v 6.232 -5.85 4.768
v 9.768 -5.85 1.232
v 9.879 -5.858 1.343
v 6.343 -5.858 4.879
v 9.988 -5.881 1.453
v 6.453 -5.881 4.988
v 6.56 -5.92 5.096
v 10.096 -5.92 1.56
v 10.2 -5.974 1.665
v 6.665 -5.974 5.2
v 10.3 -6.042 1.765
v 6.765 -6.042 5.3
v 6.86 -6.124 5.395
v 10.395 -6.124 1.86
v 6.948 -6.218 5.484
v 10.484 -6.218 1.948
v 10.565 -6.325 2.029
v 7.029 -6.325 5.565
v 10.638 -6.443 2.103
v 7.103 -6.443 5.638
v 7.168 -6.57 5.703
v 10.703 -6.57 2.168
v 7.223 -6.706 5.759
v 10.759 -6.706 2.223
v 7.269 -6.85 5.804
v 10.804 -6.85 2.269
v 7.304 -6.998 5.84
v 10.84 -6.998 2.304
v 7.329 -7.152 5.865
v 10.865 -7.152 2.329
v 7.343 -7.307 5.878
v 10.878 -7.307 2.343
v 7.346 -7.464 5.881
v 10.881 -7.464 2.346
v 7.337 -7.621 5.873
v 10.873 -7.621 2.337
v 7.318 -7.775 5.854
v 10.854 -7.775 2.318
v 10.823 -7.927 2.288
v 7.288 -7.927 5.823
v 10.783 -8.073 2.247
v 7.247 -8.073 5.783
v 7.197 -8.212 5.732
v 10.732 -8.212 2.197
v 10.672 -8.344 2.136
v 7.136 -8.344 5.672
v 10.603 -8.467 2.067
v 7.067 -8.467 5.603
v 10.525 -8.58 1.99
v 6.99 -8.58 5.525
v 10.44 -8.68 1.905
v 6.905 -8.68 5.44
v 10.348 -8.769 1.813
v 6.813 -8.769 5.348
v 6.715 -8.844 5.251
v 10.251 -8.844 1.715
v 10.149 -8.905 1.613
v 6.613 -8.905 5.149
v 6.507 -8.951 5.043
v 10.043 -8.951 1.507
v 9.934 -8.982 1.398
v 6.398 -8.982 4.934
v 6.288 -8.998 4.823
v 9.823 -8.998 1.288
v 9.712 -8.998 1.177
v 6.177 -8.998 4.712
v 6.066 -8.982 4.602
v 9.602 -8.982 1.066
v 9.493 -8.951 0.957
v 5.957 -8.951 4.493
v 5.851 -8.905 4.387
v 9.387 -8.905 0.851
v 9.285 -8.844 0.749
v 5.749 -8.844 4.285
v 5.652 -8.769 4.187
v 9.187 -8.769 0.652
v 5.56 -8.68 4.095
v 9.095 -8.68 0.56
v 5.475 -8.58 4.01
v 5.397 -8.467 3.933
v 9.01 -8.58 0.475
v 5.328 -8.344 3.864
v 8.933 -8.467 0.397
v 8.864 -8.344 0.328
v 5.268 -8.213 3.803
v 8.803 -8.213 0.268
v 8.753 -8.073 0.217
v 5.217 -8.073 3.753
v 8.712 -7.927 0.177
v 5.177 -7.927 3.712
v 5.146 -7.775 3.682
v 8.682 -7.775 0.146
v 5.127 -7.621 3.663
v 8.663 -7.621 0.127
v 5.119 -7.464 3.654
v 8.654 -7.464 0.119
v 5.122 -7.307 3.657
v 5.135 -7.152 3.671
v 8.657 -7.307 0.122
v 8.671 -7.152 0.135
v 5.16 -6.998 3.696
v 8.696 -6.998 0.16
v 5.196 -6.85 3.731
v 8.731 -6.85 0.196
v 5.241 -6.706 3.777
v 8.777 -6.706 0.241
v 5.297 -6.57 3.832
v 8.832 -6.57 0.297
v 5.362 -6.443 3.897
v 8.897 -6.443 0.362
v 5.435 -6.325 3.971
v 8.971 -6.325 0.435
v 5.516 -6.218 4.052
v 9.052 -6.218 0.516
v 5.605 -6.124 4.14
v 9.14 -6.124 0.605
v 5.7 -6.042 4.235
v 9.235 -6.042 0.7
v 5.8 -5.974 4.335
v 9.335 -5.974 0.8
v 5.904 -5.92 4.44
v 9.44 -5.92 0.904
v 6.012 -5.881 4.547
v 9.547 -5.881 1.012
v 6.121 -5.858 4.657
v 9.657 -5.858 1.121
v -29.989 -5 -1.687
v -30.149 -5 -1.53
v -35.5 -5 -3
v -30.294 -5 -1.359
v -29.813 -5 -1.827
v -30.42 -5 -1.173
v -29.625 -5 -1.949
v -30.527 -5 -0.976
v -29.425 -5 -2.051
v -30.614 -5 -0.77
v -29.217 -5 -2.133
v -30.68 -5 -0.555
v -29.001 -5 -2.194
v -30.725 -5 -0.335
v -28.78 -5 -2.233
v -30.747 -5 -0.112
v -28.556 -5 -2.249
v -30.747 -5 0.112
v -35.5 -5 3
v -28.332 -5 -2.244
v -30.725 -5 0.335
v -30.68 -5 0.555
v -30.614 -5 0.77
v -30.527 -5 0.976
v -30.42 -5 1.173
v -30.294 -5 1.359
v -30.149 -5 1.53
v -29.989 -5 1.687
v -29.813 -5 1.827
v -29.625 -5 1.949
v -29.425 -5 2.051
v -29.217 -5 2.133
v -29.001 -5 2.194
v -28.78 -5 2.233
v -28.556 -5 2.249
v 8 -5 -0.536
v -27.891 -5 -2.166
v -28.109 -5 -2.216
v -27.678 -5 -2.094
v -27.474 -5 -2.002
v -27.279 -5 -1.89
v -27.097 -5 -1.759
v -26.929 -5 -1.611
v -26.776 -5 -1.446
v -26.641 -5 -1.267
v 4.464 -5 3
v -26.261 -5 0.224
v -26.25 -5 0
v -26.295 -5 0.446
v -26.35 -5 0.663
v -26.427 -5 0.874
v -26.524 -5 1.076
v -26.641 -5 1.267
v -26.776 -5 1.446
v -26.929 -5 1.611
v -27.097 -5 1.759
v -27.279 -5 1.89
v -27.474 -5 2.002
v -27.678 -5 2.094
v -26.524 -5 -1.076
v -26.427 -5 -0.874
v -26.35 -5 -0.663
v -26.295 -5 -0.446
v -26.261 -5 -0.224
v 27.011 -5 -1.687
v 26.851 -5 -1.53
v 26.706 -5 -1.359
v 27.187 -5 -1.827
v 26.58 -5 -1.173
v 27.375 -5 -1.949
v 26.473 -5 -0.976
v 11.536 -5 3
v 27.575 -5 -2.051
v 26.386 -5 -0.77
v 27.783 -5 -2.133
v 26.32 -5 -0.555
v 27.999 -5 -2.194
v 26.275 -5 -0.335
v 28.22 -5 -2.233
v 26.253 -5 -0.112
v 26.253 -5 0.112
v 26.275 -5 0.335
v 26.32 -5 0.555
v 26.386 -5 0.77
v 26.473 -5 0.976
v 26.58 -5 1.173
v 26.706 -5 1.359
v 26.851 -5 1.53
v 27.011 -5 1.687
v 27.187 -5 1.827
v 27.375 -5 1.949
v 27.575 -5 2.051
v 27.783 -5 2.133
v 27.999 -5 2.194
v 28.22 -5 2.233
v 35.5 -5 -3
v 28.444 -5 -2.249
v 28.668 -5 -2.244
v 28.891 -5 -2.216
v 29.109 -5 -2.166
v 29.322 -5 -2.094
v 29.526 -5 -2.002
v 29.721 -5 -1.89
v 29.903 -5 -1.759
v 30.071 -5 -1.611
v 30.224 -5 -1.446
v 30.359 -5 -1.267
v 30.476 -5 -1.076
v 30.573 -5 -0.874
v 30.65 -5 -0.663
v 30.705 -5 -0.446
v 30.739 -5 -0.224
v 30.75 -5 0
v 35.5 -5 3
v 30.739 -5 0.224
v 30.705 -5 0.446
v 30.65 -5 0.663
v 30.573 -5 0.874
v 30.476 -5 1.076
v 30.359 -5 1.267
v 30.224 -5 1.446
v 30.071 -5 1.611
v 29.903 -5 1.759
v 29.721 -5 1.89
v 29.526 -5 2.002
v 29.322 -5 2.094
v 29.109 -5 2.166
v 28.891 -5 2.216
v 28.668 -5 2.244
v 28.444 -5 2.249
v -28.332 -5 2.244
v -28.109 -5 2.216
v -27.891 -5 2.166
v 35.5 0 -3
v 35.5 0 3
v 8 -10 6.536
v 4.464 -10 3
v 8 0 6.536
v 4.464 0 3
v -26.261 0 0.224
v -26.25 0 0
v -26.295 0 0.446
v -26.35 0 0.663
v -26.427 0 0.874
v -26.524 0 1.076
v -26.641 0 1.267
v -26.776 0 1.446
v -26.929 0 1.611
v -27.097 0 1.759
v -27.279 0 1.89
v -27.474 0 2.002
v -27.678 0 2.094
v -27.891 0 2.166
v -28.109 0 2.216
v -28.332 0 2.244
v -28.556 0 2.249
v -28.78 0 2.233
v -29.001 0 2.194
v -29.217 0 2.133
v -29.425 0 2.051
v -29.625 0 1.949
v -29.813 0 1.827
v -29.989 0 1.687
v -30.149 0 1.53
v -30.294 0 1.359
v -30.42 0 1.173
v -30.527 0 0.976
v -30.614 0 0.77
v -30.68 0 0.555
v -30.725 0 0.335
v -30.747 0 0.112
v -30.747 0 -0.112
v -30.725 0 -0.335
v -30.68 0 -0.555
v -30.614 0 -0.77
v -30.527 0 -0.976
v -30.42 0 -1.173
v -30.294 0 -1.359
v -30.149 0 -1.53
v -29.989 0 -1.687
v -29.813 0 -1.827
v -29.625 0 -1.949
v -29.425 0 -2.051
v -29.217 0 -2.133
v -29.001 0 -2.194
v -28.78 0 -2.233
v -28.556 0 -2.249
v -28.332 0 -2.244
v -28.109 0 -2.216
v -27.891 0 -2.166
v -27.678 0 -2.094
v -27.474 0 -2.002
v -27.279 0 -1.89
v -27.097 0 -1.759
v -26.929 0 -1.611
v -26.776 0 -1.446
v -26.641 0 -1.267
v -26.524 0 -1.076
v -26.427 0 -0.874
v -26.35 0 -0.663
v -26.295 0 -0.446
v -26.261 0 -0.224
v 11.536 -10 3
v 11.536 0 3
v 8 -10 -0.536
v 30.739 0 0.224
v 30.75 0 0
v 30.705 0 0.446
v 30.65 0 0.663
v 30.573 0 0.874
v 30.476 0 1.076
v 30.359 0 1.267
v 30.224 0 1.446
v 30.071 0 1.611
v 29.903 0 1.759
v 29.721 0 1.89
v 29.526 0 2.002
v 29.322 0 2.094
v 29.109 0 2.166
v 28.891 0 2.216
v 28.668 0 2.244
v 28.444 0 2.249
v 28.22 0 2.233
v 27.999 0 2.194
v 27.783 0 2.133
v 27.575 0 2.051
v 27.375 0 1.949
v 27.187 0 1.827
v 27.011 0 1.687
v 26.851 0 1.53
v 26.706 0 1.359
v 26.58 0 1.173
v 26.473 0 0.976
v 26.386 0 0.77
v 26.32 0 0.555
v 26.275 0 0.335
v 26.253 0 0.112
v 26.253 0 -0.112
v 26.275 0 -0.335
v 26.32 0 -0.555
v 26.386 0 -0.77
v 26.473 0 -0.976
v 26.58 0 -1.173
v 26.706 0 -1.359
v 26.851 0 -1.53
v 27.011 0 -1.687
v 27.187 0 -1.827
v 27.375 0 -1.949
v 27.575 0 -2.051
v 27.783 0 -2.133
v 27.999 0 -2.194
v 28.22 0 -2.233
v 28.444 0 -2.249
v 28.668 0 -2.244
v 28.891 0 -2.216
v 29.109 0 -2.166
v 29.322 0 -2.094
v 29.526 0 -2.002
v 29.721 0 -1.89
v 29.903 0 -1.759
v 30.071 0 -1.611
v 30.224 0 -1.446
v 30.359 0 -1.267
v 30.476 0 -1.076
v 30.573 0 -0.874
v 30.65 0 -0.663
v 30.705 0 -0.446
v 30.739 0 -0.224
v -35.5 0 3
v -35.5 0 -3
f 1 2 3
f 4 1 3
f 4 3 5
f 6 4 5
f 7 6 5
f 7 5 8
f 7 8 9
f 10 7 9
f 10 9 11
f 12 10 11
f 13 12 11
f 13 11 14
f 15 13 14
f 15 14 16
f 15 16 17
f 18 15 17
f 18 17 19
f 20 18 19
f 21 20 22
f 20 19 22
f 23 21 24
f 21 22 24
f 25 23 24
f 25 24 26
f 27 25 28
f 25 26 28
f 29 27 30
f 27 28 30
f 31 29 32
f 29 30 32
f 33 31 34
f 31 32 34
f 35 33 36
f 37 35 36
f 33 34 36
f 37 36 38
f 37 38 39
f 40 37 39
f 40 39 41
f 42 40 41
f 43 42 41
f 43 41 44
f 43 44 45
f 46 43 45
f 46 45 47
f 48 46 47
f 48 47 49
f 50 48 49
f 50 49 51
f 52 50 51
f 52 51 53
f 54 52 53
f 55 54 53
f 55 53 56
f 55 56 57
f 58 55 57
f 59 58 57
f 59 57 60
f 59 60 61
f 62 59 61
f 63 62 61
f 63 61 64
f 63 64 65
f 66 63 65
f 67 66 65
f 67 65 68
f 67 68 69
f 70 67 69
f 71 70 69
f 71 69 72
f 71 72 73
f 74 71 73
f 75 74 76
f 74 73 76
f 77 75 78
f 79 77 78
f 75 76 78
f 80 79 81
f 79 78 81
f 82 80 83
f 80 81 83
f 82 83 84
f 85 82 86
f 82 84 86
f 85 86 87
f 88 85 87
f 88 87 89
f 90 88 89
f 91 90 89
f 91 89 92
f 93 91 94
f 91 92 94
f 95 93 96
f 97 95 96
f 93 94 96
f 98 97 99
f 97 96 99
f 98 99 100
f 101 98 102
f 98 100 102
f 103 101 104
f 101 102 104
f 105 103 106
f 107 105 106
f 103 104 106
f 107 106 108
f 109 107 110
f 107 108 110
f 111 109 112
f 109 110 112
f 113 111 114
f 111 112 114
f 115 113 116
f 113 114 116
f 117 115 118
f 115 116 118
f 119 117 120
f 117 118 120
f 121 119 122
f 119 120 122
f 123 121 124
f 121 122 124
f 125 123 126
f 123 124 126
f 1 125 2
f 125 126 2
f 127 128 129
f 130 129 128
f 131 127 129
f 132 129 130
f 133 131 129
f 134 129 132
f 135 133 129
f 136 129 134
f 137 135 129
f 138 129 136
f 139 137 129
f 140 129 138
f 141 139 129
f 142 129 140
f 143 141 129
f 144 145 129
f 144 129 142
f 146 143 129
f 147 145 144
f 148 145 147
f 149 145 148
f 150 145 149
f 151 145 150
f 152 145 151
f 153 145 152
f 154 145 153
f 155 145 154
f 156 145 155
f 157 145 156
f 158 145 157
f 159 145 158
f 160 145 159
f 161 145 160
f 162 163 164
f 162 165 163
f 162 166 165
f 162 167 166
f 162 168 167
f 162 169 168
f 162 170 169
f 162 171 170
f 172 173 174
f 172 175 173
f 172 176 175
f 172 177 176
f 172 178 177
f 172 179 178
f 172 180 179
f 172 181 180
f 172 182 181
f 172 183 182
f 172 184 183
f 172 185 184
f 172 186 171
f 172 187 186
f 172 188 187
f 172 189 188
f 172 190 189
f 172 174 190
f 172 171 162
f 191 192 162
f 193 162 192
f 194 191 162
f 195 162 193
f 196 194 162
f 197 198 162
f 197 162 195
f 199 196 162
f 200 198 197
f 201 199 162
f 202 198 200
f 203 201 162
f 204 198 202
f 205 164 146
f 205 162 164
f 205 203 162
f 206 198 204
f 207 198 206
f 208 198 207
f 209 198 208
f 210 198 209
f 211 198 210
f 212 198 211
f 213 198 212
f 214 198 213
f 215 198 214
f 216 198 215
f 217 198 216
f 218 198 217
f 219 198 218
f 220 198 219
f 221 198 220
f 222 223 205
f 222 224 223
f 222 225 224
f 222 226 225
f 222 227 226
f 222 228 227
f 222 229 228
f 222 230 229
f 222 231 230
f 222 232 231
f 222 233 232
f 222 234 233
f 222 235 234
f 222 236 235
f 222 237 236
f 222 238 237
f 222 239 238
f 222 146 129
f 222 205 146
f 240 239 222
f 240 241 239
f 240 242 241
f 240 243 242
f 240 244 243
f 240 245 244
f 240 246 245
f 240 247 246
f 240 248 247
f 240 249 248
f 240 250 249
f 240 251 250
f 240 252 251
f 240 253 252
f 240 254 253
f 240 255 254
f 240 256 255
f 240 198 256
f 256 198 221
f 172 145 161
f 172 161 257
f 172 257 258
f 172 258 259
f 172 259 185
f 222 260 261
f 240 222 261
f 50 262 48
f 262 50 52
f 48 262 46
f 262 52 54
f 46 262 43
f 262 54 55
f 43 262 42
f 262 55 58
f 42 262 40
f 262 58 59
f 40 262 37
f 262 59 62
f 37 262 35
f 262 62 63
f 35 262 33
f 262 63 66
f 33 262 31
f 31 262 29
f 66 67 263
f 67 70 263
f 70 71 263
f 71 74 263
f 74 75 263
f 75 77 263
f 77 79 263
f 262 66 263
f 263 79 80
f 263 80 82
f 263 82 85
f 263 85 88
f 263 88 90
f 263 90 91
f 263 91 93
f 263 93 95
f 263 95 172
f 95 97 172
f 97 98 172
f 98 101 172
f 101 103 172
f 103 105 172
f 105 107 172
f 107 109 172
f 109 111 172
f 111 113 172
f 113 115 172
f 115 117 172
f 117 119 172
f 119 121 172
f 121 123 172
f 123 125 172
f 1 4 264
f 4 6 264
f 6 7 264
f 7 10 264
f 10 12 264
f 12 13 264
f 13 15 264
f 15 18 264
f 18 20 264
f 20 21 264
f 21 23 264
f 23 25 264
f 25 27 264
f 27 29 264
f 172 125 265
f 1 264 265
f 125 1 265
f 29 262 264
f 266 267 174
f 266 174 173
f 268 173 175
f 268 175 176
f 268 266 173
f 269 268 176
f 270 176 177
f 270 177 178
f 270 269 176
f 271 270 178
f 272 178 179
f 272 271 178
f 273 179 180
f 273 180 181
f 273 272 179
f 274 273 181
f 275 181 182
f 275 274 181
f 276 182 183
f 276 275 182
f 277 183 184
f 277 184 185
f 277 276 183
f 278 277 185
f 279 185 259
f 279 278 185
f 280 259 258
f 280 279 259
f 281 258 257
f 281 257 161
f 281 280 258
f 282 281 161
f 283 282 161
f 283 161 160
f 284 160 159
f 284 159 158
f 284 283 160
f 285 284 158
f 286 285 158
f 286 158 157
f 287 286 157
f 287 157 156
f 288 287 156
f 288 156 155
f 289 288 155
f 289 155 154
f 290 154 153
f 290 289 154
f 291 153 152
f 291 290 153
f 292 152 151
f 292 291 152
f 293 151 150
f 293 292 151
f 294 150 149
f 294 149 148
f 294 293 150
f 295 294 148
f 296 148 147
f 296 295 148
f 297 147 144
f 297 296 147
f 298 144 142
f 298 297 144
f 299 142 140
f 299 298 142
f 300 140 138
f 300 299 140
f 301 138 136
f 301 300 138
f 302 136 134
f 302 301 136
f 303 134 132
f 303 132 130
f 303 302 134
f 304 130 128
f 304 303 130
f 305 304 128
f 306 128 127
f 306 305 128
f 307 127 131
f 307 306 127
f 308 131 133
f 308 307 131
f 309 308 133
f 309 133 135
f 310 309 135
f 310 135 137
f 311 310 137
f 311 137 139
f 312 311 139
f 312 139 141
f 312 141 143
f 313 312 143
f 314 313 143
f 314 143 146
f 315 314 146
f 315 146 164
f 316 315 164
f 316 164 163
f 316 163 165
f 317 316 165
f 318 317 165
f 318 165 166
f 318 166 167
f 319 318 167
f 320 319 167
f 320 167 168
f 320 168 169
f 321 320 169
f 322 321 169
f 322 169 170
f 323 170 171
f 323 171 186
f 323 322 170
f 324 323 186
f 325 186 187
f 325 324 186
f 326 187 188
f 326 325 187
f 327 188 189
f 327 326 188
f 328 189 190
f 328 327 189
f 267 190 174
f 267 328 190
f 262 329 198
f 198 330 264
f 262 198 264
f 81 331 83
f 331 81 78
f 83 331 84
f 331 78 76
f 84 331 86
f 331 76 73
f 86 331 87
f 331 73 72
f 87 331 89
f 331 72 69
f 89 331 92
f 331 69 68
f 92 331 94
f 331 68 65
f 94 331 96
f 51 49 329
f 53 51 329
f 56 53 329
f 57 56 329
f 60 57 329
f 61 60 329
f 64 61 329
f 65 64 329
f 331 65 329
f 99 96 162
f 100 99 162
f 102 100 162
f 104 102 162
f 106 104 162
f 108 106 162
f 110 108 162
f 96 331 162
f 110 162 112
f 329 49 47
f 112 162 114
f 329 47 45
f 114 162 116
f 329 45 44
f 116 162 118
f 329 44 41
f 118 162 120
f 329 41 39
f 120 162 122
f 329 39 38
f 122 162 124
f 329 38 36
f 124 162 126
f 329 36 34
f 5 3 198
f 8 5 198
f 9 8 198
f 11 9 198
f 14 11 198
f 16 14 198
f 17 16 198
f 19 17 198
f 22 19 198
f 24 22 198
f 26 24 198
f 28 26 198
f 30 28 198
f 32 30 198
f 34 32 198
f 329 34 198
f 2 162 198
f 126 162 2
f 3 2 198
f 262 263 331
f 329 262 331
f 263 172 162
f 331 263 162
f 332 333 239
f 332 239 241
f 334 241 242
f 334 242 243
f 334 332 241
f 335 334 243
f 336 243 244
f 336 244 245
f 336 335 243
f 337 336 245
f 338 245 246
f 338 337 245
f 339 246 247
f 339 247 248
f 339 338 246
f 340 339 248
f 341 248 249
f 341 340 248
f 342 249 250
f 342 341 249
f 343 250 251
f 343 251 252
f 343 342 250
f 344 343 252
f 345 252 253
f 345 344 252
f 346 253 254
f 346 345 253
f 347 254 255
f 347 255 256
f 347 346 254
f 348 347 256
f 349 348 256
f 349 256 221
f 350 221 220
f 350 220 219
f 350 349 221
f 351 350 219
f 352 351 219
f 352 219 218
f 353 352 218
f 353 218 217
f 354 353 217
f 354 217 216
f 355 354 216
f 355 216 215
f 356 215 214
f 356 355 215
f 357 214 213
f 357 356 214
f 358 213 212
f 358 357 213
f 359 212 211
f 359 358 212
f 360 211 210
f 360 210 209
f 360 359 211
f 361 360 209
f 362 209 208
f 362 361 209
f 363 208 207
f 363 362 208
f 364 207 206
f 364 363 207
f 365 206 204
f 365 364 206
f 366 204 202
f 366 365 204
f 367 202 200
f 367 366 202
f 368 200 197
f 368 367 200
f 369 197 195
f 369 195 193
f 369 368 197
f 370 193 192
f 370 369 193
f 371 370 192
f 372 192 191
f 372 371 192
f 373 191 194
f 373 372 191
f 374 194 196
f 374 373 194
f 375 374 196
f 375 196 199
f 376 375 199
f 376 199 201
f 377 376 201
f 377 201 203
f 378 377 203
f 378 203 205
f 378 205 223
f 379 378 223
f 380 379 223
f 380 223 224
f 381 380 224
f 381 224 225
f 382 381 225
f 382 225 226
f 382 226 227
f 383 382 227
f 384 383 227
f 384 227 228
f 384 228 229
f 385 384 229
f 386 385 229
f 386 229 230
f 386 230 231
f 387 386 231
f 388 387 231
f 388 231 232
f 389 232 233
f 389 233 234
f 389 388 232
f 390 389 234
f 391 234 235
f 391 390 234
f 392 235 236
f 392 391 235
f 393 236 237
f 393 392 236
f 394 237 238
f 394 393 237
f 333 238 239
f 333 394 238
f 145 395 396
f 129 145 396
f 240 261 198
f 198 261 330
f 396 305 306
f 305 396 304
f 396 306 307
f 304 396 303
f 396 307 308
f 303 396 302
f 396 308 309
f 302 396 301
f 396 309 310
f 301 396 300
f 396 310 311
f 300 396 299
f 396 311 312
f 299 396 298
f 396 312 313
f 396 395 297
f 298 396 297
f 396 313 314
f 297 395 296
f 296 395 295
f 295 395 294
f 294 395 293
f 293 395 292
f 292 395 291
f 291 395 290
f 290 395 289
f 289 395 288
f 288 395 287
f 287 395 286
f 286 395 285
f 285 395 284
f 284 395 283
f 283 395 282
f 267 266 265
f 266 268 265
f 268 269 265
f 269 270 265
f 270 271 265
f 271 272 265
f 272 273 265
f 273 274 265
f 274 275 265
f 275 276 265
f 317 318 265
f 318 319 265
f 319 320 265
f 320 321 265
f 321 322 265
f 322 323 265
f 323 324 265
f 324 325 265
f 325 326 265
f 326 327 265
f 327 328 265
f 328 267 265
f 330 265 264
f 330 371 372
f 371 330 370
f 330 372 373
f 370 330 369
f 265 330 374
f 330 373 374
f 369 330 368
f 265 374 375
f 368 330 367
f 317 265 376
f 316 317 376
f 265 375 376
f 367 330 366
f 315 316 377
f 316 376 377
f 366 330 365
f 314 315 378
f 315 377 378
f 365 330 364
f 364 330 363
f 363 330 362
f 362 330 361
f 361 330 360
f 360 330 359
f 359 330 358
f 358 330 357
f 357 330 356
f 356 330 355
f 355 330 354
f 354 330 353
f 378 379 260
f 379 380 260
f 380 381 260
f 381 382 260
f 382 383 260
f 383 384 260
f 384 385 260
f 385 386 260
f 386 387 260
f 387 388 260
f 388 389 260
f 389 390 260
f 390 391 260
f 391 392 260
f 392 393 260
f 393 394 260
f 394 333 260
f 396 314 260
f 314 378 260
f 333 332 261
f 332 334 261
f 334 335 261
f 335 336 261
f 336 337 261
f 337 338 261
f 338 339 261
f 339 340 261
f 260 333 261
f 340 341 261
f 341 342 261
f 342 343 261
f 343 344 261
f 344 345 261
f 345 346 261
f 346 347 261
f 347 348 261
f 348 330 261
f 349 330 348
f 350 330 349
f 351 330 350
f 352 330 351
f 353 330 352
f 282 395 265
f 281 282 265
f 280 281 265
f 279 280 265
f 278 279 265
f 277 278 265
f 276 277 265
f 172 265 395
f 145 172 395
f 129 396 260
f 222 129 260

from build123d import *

# Parameters (mm, degrees)
F0_R     = 2.25
F1_DEPTH = 5
F3_DEPTH = 5
F4_R     = 1.575
F5_DEPTH = 35.7601449816


with BuildPart() as f1:
    # F0 (on Front) → F1 (new body)
    with BuildSketch(Plane.XZ):
        Polygon((35.5, -3), (35.5, 3), (11.5355339059, 3), (8, -0.5355339059), (4.4644660941, 3), (-35.5, 3), (-35.5, -3), align=None)
        with Locations((-28.5, 0)):
            Circle(F0_R, mode=Mode.SUBTRACT)
        with Locations((28.5, 0)):
            Circle(F0_R, mode=Mode.SUBTRACT)
        Polygon((8, -0.5355339059), (11.5355339059, 3), (4.4644660941, 3), align=None)
        Polygon((4.4644660941, 3), (11.5355339059, 3), (8, 6.5355339059), align=None)
    extrude(amount=F1_DEPTH)

    # F2 (on face) → F3 (join)
    with BuildSketch(Plane.XZ.offset(5)):
        Polygon((11.5355339059, 3), (8, 6.5355339059), (4.4644660941, 3), (8, -0.5355339059), align=None)
    extrude(amount=F3_DEPTH)

    # F4 (on face) → F5 (cut, through all)
    with BuildSketch(Plane(origin=(4.267766953, 0, -4.267766953), x_dir=(0, 1, 0), z_dir=(0.7071067812, 0, -0.7071067812))):
        with Locations((-7.425, 7.7781745931)):
            Circle(F4_R)
    extrude(amount=-F5_DEPTH, mode=Mode.SUBTRACT)


solid = f1.part
